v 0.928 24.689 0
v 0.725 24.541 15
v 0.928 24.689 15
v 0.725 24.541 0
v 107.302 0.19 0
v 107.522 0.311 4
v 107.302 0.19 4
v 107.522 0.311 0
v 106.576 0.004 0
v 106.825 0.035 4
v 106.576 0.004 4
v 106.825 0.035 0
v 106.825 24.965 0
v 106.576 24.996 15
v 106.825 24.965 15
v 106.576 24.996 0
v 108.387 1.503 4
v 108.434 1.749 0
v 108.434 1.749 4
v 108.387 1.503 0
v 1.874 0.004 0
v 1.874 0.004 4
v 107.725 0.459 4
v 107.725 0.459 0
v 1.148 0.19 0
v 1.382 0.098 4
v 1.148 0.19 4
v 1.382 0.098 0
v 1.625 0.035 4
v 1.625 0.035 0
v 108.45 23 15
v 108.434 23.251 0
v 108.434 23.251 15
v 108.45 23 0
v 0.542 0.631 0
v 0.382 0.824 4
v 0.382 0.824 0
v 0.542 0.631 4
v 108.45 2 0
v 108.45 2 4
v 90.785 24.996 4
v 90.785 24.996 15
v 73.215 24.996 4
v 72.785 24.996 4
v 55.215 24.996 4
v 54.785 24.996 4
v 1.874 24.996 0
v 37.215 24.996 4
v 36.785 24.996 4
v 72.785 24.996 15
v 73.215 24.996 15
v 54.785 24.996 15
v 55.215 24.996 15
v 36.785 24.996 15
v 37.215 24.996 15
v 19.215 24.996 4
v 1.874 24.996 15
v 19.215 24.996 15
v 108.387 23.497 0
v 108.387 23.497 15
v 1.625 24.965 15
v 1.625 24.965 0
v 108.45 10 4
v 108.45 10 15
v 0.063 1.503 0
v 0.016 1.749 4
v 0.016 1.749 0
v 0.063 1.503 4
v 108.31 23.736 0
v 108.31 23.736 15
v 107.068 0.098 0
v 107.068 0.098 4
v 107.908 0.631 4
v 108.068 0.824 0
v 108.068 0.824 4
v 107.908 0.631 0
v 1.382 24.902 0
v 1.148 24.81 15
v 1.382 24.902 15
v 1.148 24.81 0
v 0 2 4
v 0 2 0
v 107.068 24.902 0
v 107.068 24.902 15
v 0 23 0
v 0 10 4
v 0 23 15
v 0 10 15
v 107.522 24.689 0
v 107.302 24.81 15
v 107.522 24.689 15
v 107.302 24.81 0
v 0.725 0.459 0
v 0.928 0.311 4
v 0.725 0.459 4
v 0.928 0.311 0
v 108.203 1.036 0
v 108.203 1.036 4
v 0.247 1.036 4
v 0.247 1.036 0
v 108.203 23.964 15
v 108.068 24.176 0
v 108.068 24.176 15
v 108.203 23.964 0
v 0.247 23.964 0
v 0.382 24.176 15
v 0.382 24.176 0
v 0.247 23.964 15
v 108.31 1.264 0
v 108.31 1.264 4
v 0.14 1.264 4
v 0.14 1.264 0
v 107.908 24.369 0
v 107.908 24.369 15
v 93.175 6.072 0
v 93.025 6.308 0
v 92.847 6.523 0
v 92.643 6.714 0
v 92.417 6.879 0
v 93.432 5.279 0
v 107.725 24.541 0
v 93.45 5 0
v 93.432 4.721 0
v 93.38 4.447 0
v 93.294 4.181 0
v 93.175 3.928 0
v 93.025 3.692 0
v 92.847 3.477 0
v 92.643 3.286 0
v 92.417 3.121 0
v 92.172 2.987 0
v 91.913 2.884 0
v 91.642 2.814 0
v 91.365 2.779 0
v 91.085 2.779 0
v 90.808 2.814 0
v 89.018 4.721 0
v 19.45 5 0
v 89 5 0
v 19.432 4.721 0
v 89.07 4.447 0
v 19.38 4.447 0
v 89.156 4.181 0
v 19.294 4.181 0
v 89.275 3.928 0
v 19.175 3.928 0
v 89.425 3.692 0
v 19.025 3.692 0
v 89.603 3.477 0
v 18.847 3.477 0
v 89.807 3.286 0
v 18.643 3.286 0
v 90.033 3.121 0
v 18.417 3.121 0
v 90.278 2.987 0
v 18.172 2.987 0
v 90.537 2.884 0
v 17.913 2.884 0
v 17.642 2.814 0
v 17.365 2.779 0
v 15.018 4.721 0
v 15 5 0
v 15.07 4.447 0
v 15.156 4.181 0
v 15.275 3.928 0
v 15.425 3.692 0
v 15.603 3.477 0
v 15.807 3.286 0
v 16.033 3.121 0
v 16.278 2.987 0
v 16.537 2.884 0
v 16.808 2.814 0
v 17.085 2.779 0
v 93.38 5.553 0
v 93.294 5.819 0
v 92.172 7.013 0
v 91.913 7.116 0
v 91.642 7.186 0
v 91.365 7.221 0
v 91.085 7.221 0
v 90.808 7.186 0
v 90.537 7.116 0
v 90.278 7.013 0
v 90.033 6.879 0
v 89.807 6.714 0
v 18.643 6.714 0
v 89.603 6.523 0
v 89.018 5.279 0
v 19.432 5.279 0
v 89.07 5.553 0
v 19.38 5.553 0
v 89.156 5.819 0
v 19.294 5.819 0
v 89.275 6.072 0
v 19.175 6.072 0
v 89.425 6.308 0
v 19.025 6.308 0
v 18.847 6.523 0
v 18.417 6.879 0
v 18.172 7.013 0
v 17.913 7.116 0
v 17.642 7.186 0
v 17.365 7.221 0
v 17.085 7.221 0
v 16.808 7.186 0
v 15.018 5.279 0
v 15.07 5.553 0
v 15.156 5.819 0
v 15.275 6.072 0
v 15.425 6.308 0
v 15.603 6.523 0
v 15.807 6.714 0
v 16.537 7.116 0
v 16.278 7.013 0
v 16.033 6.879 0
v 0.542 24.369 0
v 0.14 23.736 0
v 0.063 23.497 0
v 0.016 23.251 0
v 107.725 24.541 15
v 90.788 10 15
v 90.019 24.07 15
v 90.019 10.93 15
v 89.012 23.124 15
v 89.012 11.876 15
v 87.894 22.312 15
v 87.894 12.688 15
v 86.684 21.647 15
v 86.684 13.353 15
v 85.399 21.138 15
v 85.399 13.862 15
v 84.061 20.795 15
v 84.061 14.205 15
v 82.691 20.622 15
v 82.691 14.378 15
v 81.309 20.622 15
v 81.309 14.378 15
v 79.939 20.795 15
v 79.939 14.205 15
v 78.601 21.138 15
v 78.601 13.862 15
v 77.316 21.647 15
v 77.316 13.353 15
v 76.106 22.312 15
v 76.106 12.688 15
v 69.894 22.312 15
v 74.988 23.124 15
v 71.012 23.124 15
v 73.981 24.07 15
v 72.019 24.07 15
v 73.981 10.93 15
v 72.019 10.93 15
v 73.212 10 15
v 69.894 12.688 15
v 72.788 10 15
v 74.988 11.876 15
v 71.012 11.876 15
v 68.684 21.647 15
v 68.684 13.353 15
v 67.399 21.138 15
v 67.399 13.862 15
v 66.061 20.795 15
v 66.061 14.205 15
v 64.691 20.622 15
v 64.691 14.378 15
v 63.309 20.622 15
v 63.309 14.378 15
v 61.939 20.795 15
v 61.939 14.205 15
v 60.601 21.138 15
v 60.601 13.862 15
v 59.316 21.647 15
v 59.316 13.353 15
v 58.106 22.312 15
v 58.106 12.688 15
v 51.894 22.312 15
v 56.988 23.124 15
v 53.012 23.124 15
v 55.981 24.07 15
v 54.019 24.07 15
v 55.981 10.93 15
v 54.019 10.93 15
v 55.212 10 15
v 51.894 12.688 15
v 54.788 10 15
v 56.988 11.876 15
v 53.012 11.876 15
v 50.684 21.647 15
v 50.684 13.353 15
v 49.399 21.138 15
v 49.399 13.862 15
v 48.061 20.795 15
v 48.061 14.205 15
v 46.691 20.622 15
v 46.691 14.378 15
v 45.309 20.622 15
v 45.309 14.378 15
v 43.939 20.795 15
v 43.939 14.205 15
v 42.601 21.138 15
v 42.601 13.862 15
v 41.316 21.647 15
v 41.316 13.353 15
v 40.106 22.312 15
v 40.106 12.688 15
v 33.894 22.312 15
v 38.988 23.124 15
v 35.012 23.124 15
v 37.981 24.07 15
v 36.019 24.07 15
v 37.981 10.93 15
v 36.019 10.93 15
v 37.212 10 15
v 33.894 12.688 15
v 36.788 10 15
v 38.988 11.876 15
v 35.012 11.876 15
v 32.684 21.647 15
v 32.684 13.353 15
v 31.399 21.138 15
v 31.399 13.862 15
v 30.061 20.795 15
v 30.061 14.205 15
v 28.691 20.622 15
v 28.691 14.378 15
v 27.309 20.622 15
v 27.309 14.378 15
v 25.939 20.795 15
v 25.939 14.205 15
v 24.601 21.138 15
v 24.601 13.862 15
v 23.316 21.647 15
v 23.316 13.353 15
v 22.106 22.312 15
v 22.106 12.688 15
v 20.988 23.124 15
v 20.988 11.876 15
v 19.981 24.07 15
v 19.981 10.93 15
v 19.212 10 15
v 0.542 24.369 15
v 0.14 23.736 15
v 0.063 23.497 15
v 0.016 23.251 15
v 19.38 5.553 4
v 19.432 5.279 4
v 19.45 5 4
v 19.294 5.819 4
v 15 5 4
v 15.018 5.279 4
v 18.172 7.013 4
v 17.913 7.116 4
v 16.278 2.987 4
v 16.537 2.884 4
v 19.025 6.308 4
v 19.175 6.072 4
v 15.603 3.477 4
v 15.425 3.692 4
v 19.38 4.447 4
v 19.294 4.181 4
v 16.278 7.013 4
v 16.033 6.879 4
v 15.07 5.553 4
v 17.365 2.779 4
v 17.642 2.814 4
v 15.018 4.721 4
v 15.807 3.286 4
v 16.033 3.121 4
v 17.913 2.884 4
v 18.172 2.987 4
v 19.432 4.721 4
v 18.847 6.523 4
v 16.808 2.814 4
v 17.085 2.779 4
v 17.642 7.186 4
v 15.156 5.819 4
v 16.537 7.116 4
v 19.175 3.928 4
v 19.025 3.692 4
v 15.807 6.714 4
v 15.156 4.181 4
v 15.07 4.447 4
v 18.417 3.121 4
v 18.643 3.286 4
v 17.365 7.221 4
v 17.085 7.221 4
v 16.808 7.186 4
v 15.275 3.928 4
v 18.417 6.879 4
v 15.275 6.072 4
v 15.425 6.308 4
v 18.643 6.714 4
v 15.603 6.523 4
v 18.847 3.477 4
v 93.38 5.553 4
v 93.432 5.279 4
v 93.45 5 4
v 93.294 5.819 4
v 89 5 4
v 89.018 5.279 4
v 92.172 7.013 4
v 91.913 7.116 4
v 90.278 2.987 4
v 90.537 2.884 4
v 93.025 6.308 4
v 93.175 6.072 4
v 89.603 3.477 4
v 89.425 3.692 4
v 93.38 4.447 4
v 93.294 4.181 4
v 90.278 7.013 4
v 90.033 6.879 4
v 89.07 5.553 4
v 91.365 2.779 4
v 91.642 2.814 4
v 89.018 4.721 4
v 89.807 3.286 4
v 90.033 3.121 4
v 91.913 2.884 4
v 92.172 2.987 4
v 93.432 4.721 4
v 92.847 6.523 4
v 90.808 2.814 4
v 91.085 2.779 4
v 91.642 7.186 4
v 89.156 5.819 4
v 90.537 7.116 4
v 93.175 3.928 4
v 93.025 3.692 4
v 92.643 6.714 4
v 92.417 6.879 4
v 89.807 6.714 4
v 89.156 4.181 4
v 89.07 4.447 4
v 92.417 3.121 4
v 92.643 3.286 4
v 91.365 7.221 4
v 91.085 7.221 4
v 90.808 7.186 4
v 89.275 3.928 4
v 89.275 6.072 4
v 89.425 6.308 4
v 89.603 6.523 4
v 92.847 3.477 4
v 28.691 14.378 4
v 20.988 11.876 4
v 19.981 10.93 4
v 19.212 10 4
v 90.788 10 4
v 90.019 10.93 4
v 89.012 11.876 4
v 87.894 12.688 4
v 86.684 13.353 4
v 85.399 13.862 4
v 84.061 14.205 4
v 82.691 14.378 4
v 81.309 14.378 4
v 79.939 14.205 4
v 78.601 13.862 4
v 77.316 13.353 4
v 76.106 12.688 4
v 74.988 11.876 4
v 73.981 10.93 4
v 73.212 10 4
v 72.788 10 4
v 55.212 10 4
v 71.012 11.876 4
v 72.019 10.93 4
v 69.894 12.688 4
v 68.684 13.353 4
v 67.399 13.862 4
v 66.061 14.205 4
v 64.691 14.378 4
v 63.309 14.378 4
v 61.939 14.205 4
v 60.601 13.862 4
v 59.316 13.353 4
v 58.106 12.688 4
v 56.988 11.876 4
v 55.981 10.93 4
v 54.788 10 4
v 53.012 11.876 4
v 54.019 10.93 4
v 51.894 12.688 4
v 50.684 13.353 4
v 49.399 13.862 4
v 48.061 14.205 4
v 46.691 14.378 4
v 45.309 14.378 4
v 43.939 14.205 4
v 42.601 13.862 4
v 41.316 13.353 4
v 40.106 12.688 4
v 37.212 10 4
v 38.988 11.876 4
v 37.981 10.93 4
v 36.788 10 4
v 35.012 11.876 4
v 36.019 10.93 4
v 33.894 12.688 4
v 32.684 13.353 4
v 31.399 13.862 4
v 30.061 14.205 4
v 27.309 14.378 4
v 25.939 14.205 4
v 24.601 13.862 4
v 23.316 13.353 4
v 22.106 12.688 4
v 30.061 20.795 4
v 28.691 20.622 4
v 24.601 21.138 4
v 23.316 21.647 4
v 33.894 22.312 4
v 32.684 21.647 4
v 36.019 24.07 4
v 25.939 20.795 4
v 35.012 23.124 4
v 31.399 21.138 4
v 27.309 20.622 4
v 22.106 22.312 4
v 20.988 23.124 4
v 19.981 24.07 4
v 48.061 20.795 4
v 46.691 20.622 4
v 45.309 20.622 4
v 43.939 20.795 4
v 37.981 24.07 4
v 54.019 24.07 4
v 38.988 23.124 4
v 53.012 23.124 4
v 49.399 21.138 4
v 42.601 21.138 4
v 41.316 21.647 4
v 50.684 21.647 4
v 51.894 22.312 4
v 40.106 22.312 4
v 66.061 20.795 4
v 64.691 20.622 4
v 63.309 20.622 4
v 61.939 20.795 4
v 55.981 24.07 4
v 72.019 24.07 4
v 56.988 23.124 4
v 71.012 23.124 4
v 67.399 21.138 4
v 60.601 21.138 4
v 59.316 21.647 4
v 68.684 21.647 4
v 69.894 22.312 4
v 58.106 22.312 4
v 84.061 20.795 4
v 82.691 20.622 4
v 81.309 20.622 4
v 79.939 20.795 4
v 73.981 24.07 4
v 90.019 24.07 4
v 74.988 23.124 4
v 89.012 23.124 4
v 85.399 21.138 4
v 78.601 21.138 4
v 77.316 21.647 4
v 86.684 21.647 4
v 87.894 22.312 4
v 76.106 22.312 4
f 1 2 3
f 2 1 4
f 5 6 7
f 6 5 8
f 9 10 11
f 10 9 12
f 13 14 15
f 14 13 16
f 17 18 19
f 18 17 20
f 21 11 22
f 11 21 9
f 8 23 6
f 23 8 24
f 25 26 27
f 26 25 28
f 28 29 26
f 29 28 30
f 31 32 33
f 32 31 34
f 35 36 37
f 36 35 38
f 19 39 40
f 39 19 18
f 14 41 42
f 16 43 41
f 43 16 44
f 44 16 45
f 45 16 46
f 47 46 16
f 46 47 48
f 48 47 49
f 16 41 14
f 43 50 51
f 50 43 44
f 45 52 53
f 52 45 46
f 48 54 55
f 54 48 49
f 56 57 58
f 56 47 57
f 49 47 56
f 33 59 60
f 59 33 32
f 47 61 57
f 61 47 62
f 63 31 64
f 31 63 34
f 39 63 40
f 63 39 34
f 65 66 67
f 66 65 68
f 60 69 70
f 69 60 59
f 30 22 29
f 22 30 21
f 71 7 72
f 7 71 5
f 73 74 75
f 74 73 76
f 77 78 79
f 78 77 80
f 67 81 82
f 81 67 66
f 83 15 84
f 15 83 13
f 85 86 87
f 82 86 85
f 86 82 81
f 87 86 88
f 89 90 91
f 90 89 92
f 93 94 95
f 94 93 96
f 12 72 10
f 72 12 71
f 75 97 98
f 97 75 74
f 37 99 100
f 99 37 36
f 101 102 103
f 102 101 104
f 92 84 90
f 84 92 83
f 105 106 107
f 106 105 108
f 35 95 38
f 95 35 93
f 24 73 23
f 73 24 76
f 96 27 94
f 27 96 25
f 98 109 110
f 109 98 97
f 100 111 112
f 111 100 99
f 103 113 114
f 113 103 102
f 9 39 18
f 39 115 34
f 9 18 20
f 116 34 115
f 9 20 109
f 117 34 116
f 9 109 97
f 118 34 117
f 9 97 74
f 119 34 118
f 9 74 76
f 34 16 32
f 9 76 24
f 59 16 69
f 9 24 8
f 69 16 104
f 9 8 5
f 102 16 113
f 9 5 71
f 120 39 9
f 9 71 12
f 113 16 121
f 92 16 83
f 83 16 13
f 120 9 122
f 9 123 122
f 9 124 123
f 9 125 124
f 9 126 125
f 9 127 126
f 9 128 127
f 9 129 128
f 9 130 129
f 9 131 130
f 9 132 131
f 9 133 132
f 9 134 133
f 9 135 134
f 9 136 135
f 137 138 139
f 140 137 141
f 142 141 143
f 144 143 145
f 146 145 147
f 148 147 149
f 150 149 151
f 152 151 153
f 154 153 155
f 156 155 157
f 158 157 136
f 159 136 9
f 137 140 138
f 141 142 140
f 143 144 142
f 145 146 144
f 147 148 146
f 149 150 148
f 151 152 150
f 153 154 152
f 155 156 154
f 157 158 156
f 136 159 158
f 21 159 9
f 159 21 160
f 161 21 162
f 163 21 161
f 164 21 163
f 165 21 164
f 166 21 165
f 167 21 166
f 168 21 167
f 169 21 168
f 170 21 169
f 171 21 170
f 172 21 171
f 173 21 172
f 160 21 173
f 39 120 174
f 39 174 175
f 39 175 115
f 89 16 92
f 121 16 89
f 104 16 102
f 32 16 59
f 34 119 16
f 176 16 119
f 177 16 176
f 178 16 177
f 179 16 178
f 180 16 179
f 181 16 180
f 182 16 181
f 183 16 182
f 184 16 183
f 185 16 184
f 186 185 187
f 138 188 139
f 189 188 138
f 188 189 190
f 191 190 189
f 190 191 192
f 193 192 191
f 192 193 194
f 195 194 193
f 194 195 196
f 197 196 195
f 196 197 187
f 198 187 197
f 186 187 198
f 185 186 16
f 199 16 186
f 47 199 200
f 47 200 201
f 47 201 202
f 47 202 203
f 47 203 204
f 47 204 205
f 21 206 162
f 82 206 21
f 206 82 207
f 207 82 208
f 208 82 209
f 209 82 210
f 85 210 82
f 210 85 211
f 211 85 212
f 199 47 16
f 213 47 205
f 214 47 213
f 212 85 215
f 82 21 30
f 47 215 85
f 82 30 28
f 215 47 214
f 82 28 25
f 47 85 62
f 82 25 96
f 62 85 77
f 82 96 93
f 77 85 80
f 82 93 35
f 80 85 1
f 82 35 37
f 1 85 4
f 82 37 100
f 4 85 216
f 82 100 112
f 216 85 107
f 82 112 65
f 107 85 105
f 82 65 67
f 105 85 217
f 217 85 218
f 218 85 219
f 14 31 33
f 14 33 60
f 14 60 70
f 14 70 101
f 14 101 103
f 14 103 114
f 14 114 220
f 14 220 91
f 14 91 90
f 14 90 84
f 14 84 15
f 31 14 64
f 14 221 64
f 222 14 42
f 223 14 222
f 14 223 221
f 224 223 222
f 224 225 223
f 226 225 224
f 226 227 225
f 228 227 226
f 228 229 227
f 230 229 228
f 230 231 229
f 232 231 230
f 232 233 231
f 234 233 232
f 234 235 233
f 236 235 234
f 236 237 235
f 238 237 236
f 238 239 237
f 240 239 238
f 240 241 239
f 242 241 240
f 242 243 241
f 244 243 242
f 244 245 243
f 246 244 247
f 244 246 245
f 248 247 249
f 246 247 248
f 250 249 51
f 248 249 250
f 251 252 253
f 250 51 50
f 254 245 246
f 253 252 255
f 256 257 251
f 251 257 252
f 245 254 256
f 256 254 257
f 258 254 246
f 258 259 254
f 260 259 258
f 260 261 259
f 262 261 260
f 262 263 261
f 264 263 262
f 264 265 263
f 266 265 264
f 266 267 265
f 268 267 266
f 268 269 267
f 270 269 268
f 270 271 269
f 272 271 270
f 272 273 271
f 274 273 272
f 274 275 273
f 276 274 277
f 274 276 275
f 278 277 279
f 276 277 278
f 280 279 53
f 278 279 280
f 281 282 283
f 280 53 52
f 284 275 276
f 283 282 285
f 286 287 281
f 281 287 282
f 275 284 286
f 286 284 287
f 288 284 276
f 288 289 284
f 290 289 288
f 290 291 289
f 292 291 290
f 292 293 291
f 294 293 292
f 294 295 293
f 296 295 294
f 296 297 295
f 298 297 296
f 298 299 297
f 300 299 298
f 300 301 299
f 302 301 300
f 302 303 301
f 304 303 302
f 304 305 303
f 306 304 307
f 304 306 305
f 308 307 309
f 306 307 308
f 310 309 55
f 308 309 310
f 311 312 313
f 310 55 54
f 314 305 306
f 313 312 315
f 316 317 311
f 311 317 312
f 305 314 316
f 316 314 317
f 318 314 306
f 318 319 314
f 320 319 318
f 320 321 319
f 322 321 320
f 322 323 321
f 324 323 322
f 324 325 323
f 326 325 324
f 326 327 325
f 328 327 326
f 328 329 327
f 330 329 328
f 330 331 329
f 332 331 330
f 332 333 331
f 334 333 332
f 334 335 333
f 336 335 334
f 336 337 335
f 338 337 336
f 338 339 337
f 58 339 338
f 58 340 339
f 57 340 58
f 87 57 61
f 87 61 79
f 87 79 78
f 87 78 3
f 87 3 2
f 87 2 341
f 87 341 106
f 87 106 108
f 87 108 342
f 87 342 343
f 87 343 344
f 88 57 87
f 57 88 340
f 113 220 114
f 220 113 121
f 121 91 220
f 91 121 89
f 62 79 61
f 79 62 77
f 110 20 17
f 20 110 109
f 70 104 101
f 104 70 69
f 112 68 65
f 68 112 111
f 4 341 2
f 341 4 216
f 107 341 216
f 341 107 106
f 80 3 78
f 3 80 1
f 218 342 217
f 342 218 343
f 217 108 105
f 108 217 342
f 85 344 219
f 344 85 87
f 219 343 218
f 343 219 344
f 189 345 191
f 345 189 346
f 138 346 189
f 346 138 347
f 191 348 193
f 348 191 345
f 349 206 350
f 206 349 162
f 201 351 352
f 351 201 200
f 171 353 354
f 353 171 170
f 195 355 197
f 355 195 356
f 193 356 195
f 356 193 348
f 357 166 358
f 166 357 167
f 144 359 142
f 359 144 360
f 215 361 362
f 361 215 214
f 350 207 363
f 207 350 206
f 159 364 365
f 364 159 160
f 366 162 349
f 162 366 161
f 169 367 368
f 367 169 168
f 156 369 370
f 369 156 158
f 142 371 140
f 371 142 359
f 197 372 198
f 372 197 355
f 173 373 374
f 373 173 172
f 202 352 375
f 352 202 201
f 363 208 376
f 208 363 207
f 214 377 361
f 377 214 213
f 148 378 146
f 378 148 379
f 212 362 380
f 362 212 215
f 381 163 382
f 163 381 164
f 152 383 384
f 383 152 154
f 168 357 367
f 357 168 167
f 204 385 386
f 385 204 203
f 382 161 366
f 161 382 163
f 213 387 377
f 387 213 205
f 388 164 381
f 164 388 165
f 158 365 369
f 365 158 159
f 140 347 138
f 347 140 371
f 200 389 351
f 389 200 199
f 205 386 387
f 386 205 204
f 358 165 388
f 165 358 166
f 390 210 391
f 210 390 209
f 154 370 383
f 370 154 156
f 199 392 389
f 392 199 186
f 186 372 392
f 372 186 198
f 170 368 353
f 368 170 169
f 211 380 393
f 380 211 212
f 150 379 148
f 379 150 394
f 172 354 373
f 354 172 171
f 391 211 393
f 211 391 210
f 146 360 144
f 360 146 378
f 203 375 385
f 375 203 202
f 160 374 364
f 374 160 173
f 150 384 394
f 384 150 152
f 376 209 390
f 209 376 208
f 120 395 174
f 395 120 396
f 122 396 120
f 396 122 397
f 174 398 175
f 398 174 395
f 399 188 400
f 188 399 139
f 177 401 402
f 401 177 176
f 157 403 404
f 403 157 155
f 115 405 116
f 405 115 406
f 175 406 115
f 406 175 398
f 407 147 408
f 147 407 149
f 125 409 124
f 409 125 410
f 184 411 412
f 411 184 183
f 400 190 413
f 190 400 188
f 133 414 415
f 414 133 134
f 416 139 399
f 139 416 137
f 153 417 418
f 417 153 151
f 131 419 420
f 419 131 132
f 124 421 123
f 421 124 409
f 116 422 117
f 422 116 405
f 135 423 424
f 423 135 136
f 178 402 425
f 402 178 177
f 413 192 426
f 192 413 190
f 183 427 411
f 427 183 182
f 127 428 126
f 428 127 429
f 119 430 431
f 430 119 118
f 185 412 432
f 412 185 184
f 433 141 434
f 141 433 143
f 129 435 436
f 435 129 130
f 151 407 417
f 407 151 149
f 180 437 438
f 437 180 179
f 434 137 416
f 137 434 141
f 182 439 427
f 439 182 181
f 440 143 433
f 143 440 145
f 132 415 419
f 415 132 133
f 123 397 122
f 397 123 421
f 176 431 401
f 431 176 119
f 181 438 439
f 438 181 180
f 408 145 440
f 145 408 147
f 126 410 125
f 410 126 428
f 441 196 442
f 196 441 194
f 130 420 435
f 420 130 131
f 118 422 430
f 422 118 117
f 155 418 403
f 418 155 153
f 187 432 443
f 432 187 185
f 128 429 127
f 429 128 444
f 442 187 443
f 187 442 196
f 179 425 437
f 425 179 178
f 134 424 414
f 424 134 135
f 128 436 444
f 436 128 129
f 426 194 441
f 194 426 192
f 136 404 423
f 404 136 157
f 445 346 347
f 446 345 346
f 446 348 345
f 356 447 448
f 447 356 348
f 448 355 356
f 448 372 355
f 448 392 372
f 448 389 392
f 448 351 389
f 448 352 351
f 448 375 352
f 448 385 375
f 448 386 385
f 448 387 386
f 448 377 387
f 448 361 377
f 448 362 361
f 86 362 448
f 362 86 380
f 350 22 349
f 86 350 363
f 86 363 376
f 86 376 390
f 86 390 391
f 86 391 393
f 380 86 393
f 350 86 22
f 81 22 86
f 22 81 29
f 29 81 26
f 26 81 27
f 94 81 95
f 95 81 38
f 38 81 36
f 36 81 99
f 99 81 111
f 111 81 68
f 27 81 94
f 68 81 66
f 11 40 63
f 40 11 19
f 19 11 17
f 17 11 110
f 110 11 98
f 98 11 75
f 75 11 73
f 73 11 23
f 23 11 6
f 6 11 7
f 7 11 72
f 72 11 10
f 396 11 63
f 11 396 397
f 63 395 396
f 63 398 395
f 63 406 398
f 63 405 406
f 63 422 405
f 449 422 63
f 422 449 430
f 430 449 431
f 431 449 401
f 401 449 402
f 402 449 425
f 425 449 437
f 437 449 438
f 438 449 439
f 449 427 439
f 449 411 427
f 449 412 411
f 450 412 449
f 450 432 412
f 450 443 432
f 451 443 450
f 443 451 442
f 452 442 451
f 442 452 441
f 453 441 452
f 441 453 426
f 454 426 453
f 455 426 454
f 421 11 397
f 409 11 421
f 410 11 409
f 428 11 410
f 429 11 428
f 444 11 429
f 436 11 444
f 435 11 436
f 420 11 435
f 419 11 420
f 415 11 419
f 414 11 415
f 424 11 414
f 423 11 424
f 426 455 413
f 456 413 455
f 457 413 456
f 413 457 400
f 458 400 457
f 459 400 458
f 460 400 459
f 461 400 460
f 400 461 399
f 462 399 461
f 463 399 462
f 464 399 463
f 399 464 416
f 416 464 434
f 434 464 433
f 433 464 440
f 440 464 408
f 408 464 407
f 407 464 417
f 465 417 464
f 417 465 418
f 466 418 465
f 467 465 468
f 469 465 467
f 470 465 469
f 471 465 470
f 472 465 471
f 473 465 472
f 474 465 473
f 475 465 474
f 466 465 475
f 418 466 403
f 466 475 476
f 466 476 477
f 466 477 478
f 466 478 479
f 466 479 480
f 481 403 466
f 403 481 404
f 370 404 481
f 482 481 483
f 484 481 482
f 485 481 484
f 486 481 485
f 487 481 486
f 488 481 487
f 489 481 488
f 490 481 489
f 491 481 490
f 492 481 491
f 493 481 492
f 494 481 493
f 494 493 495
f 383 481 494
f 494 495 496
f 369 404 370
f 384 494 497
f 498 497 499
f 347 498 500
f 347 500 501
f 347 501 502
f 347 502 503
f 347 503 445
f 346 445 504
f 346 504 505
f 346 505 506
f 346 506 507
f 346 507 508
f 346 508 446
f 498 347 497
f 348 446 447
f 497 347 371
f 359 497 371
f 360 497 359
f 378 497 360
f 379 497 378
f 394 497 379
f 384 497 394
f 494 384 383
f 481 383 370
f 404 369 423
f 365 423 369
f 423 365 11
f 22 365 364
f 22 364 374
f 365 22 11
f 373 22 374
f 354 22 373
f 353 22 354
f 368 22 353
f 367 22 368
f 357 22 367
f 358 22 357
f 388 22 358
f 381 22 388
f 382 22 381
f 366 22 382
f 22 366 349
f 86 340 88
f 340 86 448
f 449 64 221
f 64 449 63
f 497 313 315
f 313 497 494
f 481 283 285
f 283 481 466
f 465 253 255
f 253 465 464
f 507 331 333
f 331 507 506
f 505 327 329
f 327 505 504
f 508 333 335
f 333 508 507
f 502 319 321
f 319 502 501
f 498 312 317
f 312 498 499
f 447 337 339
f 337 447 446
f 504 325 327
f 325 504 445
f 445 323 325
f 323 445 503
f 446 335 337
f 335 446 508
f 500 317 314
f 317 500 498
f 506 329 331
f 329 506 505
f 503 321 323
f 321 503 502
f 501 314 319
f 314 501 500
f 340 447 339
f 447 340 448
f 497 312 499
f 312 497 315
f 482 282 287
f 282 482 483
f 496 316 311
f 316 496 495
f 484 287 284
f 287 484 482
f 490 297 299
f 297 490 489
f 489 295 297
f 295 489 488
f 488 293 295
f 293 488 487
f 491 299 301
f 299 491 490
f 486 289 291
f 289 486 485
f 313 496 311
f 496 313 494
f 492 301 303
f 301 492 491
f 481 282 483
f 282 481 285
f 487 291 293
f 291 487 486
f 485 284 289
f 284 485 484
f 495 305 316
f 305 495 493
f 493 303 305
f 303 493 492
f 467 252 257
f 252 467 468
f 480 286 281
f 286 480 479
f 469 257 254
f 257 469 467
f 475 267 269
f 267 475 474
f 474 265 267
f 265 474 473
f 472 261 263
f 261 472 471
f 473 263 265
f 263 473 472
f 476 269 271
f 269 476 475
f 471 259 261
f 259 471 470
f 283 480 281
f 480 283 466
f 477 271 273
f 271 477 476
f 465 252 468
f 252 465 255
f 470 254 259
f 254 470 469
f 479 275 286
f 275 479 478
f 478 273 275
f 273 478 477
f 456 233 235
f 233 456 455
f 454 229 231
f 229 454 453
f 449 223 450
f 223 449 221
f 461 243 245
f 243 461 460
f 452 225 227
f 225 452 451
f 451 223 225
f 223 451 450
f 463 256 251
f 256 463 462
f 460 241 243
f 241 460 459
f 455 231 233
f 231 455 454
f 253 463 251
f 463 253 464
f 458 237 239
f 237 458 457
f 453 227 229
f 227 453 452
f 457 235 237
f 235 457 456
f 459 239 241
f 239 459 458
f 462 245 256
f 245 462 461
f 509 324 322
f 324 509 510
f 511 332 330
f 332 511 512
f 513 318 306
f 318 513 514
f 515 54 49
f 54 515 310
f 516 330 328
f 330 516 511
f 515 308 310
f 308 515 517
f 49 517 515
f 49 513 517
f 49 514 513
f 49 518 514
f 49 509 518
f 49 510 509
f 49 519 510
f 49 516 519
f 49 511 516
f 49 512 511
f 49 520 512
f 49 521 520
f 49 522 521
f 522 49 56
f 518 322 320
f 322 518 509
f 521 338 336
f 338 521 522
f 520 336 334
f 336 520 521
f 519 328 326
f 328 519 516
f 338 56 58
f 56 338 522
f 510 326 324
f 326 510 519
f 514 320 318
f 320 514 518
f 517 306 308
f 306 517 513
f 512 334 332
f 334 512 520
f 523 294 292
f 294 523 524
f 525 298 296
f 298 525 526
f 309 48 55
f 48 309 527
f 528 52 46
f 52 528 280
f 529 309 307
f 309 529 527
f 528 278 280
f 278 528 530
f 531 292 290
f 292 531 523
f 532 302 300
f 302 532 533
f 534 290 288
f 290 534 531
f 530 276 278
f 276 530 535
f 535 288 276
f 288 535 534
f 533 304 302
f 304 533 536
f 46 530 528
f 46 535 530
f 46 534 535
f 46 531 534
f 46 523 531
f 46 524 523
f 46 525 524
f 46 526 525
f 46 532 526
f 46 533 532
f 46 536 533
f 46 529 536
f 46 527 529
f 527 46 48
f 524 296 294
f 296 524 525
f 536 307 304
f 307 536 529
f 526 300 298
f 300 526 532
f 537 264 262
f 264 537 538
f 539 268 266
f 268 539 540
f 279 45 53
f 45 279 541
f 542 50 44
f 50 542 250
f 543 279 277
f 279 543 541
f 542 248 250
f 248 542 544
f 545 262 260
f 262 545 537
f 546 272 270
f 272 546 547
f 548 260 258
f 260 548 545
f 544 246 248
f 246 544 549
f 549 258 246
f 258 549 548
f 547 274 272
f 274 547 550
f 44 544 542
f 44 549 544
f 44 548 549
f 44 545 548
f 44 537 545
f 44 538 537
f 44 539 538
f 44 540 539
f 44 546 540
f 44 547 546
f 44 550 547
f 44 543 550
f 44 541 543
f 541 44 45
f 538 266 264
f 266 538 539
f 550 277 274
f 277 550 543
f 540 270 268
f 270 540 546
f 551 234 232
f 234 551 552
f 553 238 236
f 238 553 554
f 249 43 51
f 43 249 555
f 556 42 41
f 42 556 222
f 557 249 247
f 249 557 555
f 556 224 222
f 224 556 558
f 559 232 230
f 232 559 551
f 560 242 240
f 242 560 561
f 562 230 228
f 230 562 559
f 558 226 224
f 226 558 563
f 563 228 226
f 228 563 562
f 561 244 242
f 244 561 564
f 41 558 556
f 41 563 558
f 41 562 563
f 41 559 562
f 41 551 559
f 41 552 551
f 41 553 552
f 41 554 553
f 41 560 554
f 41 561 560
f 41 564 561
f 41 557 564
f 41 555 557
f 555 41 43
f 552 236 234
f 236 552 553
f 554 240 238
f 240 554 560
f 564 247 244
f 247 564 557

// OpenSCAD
holeDiameter = 4.45;
centerToCenter = 74;
lengthHoleOffset = 15;
length = centerToCenter + lengthHoleOffset * 2 + holeDiameter;
width = 25;
height = 15;
screwOffset = 10;
screwSectionHeight = 4;
fingerHoleDiameter = 22;
fingerHoleOffset = fingerHoleDiameter * .8;
fingerHoleHeight = height - screwSectionHeight;
firstFingerHole = 10;
spaceBetweenFingerHoles = 18;

$fn=50;
difference() {
    union(){
            $fn=50;
            minkowski()
            {
              translate([2,2,0])
                cube([length-4, width-4, height - 1]);
              cylinder(r=2,h=1);
            }
        }
    translate([lengthHoleOffset + holeDiameter/2, 5, 0])
        cylinder(d=holeDiameter, h=height);
    translate([length - (lengthHoleOffset + holeDiameter/2), 5, 0])
        cylinder(d=holeDiameter, h=height);
    translate([0, 0, screwSectionHeight ])
        cube([length, screwOffset, height - screwSectionHeight ]);
    translate([firstFingerHole + spaceBetweenFingerHoles * 1, screwOffset - fingerHoleOffset + fingerHoleDiameter/2, 0])
        FingerHole();
    translate([firstFingerHole + spaceBetweenFingerHoles * 2, screwOffset - fingerHoleOffset + fingerHoleDiameter/2, 0])
        FingerHole();
    translate([firstFingerHole + spaceBetweenFingerHoles * 3, screwOffset - fingerHoleOffset + fingerHoleDiameter/2, 0])
        FingerHole();
    translate([firstFingerHole + spaceBetweenFingerHoles * 4, screwOffset - fingerHoleOffset + fingerHoleDiameter/2, 0])
        FingerHole();
    translate([firstFingerHole + spaceBetweenFingerHoles * 1, width + fingerHoleOffset - fingerHoleDiameter / 2, 0])
        FingerHole();
    translate([firstFingerHole + spaceBetweenFingerHoles * 2, width + fingerHoleOffset - fingerHoleDiameter / 2, 0])
        FingerHole();
    translate([firstFingerHole + spaceBetweenFingerHoles * 3, width + fingerHoleOffset - fingerHoleDiameter / 2, 0])
        FingerHole();
    translate([firstFingerHole + spaceBetweenFingerHoles * 4, width + fingerHoleOffset - fingerHoleDiameter / 2, 0])
        FingerHole();
}

module FingerHole() {
    translate([0, 0, height - fingerHoleHeight])
        cylinder(d=fingerHoleDiameter, h=fingerHoleHeight);
}
